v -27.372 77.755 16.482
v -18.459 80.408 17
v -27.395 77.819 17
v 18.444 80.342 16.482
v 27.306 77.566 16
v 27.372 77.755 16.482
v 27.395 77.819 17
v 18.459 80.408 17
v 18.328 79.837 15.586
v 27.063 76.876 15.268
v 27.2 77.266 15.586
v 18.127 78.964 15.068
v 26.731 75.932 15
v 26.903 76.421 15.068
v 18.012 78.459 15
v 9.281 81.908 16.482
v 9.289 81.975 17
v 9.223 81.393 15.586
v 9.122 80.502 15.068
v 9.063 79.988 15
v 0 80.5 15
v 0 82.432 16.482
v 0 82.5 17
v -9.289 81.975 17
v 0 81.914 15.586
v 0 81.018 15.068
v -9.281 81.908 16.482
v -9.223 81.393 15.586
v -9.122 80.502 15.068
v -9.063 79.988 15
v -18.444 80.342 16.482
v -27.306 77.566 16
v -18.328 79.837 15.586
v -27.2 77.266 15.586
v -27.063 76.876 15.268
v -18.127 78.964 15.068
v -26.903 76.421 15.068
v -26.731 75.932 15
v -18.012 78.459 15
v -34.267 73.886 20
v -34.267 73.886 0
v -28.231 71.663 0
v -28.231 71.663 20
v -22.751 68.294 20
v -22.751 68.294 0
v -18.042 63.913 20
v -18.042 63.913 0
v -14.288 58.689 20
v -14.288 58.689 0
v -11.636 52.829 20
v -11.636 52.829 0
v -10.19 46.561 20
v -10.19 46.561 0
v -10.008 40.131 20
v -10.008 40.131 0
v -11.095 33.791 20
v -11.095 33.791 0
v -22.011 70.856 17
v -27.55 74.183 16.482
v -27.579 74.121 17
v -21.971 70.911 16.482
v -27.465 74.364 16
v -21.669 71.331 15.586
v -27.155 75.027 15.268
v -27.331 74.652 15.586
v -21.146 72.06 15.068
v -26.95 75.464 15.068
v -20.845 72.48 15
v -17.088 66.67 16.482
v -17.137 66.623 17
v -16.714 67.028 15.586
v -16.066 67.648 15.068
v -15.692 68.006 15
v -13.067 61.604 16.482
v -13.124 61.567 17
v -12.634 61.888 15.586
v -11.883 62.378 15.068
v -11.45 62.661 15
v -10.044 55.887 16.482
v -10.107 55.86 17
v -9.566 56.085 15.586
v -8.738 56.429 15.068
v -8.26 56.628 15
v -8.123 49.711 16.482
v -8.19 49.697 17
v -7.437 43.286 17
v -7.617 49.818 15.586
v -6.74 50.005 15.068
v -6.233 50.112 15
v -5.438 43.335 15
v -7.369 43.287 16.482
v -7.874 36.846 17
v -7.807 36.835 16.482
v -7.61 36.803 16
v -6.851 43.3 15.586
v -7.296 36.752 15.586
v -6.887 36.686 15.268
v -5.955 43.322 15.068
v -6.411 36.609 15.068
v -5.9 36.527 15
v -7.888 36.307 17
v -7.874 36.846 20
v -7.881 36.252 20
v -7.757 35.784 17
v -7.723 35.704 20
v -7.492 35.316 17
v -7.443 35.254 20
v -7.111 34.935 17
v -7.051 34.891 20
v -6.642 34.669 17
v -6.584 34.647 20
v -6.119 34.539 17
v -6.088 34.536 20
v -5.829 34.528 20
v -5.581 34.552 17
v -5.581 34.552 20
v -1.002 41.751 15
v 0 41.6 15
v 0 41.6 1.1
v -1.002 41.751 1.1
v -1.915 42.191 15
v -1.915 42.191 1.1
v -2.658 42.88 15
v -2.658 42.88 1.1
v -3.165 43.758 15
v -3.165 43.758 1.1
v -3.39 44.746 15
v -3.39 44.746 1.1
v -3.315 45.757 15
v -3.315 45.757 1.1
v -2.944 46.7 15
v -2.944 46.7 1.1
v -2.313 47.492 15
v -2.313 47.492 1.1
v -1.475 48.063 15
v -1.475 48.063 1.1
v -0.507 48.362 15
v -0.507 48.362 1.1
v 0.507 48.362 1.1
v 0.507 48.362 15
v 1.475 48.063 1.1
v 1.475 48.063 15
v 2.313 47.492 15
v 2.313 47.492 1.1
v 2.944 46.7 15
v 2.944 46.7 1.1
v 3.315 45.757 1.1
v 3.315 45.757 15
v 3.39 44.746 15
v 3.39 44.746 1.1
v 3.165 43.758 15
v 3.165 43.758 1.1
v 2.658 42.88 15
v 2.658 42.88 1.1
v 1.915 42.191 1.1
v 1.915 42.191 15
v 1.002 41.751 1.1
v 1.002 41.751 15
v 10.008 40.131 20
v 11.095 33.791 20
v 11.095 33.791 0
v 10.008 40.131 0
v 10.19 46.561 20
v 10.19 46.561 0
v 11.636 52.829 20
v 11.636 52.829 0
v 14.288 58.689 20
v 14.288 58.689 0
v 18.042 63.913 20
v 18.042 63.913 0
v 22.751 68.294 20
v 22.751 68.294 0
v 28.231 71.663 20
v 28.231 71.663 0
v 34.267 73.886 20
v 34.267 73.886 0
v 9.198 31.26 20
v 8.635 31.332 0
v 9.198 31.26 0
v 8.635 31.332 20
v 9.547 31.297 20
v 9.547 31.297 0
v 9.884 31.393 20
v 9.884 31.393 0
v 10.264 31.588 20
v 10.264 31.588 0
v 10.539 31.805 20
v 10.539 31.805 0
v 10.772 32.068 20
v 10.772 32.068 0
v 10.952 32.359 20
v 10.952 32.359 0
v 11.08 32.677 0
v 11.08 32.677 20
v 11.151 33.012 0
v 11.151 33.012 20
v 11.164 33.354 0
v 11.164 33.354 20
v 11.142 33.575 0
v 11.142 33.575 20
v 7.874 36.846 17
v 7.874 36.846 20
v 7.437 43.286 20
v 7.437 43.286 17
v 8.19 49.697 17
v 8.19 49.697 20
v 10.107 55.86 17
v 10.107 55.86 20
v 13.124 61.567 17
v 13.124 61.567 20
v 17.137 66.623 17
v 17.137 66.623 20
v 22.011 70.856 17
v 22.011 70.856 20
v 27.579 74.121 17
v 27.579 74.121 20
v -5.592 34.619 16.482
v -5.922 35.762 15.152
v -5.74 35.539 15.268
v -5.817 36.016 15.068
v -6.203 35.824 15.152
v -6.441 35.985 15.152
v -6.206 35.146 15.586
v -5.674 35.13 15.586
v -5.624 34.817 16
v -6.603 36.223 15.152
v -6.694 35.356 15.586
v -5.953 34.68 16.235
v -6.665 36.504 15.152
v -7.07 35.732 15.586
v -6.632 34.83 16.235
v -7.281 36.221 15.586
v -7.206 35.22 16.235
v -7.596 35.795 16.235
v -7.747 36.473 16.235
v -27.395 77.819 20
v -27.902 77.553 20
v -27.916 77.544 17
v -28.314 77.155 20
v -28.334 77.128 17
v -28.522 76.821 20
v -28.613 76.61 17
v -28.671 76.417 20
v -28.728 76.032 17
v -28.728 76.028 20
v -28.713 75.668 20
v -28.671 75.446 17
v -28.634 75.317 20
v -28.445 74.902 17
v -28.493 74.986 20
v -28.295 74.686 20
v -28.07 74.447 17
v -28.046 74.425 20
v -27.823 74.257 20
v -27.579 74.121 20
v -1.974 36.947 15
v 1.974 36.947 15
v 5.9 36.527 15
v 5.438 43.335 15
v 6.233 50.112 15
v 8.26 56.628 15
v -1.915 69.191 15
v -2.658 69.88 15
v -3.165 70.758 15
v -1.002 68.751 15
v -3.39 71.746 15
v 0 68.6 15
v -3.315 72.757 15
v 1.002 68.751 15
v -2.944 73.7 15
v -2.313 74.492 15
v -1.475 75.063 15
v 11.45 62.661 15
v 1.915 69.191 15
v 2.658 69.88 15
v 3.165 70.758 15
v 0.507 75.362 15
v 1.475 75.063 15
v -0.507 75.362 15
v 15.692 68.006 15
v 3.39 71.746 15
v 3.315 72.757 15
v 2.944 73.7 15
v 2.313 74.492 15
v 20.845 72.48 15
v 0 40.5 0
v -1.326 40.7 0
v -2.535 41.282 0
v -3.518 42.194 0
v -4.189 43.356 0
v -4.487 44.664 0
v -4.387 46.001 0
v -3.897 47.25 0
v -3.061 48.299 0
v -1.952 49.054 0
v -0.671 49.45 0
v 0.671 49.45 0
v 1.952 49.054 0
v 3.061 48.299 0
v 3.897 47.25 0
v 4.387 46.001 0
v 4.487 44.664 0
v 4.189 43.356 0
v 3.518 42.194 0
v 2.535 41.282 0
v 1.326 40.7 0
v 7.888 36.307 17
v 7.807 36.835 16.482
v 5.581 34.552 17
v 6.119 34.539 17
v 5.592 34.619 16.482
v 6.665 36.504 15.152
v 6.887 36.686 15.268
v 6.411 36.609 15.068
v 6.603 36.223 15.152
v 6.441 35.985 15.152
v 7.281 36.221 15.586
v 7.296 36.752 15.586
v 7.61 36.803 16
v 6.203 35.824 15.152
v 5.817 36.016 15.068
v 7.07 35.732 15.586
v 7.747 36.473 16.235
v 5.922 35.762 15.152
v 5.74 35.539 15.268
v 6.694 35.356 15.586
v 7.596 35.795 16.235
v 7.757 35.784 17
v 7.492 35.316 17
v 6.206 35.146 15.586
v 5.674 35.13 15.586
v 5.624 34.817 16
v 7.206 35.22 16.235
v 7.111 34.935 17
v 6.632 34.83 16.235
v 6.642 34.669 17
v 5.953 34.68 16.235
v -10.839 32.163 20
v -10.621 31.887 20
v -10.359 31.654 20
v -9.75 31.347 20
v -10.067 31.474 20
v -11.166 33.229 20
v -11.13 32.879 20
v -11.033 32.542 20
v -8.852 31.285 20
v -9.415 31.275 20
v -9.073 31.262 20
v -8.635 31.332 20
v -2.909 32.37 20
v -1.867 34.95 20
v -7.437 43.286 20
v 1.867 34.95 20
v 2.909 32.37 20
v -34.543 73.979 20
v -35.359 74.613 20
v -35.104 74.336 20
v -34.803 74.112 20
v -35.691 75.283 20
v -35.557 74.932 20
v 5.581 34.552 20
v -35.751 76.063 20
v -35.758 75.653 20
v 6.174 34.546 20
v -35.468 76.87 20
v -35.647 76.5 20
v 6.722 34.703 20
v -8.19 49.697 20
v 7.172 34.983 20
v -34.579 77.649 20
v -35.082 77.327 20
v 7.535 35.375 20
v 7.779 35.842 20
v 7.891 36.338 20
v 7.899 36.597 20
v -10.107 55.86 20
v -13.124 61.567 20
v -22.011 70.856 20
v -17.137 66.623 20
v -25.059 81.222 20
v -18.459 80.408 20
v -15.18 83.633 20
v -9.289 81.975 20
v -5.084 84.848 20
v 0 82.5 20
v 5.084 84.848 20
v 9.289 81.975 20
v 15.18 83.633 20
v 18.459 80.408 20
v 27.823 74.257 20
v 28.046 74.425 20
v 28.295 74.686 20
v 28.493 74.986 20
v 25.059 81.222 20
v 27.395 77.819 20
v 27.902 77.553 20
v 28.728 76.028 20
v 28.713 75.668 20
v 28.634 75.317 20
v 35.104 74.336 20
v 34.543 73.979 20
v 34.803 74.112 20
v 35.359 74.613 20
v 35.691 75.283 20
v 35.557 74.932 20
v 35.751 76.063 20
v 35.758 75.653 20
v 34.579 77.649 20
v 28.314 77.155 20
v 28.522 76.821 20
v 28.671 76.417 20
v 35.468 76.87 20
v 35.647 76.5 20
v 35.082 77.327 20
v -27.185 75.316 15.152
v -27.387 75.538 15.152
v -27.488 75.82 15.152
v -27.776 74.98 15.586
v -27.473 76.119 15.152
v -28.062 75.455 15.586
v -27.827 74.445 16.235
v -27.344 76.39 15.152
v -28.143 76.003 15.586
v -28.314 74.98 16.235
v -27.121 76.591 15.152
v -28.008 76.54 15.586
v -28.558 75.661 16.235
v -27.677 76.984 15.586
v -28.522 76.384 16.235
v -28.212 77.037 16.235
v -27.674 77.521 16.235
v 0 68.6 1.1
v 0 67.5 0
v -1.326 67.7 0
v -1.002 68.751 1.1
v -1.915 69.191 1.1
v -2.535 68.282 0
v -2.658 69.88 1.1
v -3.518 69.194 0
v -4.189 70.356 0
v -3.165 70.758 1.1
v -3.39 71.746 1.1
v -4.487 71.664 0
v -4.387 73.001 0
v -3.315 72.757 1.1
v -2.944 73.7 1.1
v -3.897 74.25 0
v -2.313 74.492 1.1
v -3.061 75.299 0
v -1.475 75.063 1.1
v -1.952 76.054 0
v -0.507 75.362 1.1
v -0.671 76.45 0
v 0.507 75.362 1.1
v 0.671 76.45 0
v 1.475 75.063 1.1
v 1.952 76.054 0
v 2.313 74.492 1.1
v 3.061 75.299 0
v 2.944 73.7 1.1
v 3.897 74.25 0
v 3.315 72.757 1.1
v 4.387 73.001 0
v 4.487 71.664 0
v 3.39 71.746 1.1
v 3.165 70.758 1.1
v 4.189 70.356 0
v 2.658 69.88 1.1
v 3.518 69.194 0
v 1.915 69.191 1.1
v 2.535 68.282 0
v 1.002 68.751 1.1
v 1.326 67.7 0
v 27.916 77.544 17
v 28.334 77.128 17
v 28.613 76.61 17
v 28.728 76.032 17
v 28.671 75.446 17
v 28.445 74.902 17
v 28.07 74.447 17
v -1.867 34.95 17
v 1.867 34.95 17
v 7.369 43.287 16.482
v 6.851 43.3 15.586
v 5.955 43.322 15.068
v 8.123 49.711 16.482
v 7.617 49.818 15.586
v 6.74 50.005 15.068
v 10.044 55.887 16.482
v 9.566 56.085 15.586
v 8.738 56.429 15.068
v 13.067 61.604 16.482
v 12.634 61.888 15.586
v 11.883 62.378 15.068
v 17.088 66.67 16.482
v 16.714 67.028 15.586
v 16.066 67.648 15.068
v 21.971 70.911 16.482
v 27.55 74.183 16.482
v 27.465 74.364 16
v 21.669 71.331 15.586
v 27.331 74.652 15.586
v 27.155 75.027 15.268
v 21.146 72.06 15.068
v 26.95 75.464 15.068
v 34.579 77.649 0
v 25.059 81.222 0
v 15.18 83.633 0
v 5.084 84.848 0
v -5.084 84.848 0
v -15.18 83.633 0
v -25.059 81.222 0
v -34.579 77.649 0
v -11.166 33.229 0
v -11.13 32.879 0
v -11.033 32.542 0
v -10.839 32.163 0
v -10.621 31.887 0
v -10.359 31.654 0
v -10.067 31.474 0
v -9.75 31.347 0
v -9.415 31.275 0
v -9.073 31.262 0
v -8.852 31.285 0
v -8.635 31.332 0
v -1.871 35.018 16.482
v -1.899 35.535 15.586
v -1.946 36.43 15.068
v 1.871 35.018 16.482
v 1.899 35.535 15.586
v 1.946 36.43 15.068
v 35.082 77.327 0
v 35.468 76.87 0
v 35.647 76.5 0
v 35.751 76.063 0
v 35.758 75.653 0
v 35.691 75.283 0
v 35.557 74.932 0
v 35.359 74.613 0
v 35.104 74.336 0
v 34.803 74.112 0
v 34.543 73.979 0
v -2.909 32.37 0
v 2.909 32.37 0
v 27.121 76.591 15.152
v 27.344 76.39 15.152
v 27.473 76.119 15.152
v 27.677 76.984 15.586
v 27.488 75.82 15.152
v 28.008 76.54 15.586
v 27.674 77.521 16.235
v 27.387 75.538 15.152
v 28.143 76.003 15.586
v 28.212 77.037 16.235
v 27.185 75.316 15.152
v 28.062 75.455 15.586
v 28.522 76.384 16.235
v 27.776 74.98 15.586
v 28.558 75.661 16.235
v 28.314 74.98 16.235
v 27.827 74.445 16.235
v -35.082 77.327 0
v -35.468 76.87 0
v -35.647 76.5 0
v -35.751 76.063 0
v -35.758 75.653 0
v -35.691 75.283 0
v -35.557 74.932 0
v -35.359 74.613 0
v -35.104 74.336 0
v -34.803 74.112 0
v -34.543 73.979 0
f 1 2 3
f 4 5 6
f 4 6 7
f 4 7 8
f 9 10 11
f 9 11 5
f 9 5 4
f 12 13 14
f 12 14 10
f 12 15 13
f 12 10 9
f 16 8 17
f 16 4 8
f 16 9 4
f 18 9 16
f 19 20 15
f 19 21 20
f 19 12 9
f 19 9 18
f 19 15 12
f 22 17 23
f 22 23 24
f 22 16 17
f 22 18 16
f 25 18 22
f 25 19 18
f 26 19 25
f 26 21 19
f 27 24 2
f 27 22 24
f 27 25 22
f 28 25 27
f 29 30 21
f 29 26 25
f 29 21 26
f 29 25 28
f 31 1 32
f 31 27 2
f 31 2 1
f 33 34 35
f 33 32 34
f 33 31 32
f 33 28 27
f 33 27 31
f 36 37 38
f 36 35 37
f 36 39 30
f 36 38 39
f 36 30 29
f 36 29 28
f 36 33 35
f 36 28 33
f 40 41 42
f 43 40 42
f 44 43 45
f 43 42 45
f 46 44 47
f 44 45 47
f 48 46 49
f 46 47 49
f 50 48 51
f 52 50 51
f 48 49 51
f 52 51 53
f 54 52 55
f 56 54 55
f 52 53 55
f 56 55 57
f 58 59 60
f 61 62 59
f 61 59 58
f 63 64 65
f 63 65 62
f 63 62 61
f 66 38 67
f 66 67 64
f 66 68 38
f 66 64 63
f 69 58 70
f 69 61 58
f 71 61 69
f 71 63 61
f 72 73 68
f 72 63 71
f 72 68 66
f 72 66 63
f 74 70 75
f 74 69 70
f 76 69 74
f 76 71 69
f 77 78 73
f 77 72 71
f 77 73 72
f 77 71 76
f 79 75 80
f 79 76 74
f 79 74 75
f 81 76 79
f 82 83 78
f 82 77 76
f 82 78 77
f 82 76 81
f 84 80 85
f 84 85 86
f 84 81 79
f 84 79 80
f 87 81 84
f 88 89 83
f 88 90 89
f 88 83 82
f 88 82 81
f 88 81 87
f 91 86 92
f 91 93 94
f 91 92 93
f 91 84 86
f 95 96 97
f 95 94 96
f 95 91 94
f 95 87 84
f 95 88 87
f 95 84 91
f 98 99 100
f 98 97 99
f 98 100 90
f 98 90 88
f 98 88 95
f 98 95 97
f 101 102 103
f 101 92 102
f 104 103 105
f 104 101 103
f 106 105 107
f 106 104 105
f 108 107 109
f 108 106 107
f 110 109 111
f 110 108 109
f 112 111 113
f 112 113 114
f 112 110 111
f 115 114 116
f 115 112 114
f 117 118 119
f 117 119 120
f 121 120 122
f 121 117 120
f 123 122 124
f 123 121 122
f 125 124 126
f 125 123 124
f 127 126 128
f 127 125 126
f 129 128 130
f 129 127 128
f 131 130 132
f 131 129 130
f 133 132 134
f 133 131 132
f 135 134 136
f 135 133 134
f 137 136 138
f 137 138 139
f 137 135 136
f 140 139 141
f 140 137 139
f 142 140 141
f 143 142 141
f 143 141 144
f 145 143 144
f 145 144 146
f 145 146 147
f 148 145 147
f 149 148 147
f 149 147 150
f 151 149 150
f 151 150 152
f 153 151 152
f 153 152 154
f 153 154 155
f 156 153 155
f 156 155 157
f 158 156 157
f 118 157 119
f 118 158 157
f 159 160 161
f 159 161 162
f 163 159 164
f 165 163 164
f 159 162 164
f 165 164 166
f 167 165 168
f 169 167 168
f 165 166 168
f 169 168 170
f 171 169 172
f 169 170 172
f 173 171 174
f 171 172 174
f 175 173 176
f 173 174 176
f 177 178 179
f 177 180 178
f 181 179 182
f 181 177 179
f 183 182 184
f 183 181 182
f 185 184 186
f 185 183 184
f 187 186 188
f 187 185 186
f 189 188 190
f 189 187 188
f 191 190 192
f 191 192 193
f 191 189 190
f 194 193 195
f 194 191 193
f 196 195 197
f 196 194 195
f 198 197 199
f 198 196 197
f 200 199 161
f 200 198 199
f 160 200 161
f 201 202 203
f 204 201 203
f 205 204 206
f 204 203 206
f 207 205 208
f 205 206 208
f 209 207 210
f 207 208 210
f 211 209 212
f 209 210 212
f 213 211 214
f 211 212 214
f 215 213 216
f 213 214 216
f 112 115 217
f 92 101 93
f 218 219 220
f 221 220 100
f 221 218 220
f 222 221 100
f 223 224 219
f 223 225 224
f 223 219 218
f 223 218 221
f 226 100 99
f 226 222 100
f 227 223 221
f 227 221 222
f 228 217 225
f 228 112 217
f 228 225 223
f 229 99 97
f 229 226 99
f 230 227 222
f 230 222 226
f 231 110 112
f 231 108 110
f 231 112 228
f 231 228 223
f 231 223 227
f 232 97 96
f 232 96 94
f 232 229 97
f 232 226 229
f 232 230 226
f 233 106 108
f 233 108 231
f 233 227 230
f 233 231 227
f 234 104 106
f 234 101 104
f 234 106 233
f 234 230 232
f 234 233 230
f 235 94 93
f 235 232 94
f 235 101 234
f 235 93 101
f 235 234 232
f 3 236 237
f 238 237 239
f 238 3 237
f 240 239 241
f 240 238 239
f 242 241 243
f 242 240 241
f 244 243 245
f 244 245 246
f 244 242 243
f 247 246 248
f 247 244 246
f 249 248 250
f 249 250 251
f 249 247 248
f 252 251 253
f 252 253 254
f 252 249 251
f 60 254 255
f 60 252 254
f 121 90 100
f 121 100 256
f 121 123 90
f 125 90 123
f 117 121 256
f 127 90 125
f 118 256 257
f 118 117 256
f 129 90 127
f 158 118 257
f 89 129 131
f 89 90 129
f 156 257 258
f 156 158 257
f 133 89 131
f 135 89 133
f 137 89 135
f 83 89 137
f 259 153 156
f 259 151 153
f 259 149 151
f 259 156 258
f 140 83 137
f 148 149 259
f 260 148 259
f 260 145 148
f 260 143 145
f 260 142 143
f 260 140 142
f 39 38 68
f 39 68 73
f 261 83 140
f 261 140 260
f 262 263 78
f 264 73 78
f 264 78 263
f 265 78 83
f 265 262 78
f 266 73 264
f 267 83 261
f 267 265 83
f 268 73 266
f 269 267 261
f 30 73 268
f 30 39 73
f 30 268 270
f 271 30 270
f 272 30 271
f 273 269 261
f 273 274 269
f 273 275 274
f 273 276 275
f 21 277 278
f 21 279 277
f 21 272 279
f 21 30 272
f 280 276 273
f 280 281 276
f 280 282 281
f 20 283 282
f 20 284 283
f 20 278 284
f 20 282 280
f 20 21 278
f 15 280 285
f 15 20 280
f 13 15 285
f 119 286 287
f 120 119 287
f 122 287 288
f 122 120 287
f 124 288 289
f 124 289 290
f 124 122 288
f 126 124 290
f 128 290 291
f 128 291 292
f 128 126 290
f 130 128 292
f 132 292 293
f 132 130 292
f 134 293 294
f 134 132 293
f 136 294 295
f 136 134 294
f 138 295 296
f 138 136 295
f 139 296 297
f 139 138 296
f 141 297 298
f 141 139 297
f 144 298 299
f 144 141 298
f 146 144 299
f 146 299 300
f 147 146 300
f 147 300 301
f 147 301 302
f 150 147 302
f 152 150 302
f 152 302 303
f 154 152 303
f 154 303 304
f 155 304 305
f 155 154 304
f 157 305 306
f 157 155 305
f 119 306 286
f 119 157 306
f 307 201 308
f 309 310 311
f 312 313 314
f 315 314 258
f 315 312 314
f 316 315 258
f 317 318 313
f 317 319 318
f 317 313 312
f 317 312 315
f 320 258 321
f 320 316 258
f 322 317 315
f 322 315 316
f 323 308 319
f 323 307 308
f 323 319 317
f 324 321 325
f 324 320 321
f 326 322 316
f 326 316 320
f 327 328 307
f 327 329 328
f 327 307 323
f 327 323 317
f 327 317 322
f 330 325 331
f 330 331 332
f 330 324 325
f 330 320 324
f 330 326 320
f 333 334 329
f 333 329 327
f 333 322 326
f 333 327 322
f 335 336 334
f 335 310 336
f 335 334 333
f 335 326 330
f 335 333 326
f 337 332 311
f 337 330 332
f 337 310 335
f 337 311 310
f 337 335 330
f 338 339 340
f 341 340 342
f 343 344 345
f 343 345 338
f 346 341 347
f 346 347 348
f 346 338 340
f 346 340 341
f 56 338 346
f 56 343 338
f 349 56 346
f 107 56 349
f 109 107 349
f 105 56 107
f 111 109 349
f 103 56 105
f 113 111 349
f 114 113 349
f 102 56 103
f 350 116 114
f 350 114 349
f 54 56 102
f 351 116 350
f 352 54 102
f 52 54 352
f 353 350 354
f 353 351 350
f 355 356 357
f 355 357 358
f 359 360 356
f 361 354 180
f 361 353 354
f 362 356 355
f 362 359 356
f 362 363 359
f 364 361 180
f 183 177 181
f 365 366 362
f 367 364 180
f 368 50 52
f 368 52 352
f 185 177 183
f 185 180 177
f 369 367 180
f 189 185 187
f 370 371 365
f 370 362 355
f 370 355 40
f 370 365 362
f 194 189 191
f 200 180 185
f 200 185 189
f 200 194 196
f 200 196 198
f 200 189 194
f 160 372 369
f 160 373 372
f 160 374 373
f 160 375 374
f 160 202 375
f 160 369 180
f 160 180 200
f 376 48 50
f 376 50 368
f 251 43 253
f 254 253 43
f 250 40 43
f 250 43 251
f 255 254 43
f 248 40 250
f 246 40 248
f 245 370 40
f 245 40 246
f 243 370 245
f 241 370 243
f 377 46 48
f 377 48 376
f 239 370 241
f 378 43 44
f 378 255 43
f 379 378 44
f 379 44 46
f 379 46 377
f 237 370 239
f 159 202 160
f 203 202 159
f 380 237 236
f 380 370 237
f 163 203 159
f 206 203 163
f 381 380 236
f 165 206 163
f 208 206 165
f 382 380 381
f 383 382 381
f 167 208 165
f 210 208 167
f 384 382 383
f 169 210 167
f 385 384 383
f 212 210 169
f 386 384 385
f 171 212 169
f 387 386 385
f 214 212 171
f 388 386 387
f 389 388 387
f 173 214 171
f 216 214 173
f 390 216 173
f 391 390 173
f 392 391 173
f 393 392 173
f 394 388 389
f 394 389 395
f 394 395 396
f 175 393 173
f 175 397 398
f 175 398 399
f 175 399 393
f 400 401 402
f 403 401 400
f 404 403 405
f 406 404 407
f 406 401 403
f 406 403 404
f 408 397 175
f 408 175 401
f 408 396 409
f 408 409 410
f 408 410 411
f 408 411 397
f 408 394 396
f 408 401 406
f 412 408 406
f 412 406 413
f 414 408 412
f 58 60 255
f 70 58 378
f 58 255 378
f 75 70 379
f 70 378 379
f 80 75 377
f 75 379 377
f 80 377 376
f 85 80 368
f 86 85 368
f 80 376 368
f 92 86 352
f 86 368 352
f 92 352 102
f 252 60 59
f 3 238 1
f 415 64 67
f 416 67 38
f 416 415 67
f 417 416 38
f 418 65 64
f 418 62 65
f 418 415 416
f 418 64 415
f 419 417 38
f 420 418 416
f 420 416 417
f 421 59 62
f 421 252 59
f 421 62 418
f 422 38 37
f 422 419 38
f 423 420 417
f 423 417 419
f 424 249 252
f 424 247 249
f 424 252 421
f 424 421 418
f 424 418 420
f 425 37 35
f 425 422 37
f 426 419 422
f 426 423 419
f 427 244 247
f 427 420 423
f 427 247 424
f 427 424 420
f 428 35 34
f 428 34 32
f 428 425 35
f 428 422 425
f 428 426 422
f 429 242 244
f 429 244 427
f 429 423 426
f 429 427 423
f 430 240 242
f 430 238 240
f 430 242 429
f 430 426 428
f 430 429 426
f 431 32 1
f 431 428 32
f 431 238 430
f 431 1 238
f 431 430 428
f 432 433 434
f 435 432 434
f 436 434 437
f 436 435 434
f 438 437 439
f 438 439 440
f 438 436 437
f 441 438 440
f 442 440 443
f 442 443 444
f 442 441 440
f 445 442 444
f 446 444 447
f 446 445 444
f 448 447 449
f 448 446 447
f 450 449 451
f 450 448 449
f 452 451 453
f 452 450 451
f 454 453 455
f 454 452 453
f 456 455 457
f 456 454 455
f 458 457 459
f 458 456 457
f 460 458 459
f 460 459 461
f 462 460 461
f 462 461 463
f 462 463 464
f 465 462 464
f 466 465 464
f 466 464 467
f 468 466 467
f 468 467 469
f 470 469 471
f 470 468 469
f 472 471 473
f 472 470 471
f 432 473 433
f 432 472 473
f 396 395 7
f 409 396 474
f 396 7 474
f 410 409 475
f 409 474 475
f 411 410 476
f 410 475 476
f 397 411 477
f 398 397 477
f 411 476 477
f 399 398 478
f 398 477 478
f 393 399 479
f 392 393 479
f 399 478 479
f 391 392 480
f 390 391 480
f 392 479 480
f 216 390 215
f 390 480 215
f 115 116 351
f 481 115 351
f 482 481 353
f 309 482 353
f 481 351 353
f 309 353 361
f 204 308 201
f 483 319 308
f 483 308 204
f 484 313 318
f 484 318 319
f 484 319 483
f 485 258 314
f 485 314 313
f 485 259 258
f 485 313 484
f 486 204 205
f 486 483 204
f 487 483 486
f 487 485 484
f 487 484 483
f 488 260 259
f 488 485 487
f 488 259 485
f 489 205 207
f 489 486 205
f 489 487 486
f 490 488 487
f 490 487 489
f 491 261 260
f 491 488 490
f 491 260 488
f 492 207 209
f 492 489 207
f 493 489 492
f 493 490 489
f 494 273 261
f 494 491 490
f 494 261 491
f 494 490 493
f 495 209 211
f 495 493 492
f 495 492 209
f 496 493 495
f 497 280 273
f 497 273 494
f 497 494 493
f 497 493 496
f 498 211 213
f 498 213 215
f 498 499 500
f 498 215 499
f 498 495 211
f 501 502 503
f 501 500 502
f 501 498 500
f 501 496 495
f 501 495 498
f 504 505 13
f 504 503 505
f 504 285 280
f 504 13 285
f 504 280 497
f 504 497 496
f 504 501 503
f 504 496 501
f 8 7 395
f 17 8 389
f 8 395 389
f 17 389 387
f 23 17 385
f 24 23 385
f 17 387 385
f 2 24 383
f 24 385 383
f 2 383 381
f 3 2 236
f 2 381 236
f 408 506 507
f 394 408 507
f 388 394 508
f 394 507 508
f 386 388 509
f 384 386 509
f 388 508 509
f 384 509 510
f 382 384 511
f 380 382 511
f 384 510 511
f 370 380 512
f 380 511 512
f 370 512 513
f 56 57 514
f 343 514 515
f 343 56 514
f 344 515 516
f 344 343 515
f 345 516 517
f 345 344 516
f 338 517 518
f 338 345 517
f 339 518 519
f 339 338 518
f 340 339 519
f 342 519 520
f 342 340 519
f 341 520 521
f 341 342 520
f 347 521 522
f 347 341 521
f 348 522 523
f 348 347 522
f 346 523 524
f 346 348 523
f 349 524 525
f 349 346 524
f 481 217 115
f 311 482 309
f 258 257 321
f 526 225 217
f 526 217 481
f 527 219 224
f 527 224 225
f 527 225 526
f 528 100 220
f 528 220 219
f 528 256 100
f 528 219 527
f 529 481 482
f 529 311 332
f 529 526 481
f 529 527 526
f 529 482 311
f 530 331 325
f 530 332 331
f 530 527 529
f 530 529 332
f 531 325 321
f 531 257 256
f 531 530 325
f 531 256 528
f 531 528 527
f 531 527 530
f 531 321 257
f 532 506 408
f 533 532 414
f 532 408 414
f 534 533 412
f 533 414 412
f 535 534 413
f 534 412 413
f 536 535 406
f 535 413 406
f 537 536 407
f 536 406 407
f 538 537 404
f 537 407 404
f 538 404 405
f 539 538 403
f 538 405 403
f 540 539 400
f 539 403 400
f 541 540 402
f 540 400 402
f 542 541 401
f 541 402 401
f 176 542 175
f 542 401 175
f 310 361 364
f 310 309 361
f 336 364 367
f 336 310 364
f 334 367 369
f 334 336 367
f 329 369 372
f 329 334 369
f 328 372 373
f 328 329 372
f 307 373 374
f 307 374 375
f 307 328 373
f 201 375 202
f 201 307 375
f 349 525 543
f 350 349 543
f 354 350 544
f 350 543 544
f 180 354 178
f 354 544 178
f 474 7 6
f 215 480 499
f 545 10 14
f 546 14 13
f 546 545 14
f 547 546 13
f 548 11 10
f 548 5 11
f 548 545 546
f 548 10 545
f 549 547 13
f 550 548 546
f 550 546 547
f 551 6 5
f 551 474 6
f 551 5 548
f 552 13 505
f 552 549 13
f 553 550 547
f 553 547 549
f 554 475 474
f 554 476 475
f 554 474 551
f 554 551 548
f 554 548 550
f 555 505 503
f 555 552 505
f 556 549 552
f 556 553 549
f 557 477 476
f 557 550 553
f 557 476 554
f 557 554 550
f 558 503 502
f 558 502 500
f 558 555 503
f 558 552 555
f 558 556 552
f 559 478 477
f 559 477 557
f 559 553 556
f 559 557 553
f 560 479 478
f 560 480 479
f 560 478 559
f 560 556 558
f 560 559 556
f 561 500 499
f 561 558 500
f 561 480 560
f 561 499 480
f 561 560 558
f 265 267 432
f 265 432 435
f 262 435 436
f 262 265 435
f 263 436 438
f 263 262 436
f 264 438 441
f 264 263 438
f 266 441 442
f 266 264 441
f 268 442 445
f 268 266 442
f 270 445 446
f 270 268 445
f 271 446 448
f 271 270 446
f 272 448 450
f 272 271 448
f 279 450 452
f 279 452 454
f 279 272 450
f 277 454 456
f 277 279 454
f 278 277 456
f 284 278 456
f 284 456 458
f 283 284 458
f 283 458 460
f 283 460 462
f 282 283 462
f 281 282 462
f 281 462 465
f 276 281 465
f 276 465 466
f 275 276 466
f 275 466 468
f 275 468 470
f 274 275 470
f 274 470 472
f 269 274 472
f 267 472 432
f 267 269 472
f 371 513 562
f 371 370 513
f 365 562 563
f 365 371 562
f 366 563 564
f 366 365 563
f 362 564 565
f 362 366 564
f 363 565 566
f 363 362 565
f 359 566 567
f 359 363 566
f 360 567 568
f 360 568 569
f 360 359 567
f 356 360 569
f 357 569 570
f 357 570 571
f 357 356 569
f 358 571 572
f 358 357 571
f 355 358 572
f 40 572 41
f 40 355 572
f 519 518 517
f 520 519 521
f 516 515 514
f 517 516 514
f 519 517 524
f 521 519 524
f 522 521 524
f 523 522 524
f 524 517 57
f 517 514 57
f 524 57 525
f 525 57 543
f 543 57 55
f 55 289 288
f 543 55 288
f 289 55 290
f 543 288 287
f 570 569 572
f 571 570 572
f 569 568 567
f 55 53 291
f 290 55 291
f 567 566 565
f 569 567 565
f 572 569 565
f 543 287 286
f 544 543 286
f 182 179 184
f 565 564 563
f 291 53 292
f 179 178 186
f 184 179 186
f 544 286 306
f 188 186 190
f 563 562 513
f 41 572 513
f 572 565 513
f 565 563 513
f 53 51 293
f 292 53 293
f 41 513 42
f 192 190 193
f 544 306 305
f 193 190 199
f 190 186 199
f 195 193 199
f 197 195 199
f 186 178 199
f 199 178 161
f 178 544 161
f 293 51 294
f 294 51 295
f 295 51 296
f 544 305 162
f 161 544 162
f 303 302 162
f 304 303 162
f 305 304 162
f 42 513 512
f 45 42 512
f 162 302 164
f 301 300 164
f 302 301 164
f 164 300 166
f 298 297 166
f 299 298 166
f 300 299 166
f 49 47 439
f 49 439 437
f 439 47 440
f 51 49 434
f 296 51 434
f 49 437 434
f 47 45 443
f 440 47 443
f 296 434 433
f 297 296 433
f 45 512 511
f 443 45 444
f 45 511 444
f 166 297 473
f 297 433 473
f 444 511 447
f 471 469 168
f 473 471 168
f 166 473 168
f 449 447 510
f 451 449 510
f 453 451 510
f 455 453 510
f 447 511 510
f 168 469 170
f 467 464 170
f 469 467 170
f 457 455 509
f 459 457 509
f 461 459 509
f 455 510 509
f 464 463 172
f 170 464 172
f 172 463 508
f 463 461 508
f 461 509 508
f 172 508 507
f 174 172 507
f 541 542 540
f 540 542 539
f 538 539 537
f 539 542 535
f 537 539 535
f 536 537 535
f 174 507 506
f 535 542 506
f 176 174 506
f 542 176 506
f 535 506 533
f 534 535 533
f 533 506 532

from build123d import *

# Parameters (mm, degrees)
BOSS_EXTRUDE1_DEPTH             = 20
FILLET1_R                       = 2
RECESS_DEPTH                    = 5
RECESS_FILLET_R                 = 2
M8X1_25_TAPPED_HOLE2_AT_2_COUNT = 2
M8X1_25_TAPPED_HOLE2_AT_2_PITCH = 27


with BuildPart() as part:
    # Sketch1 → Boss-Extrude1 (new body)
    with BuildSketch(Plane.XY):
        with BuildLine():
            ThreePointArc((40.270970206, 74.854852606), (0, 85), (-40.270970206, 74.854852606))
            ThreePointArc((-40.270970206, 74.854852606), (-14.837398118, 59.604782697), (-12.374368671, 30.0520382))
            ThreePointArc((-12.374368671, 30.0520382), (0, 32.5), (12.374368671, 30.0520382))
            ThreePointArc((12.374368671, 30.0520382), (14.837398118, 59.604782697), (40.270970206, 74.854852606))
        make_face()
    extrude(amount=BOSS_EXTRUDE1_DEPTH)

    # Fillet1
    fillet1_edges = [part.edges().sort_by_distance(p)[0] for p in [
        (-12.374368671, 30.0520382, 10),
        (-40.270970206, 74.854852606, 10),
        (40.270970206, 74.854852606, 10),
        (12.374368671, 30.0520382, 10),
    ]]
    fillet(fillet1_edges, radius=FILLET1_R)

    # Sketch6 → Recess (cut)
    with BuildSketch(Plane.XY.offset(20)):
        with BuildLine():
            ThreePointArc((32.278956857, 75.923112056), (0, 82.5), (-32.278956857, 75.923112056))
            ThreePointArc((-32.278956857, 75.923112056), (-11.986412015, 59.700859487), (-8.465654652, 33.96075222))
            ThreePointArc((-8.465654652, 33.96075222), (0, 35), (8.465654652, 33.96075222))
            ThreePointArc((8.465654652, 33.96075222), (11.986412015, 59.700859487), (32.278956857, 75.923112056))
        make_face()
    extrude(amount=-RECESS_DEPTH, mode=Mode.SUBTRACT)

    # Recess Fillet
    recess_fillet_edges = [part.edges().sort_by_distance(p)[0] for p in [
        (11.986412015, 59.700859487, 15),
        (32.278956857, 75.923112056, 17.5),
        (0, 35, 15),
        (8.465654652, 33.96075222, 17.5),
        (-11.986412015, 59.700859487, 15),
        (-8.465654652, 33.96075222, 17.5),
        (0, 82.5, 15),
        (-32.278956857, 75.923112056, 17.5),
    ]]
    fillet(recess_fillet_edges, radius=RECESS_FILLET_R)

    # Sketch5 → M8x1.25 Tapped Hole2 (revolve, cut)
    with BuildSketch(Plane(origin=(0, 45, 20), x_dir=(0, -1, 0), z_dir=(1, 0, 0))):
        Polygon((0, 0), (0, 20), (4.5, 20), (3.4, 18.9), (3.4, 1.1), (4.5, 0), align=None)
    m8x1_25_tapped_hole2 = revolve(axis=Axis((0, 45, 26.35), (0, 0, -1)), mode=Mode.SUBTRACT)

    # M8x1.25 Tapped Hole2 at 2: M8x1.25 Tapped Hole2 ×2
    with Locations(*[(0, i * M8X1_25_TAPPED_HOLE2_AT_2_PITCH, 0) for i in range(1, M8X1_25_TAPPED_HOLE2_AT_2_COUNT)]):
        add(m8x1_25_tapped_hole2, mode=Mode.SUBTRACT)


solid = part.part
